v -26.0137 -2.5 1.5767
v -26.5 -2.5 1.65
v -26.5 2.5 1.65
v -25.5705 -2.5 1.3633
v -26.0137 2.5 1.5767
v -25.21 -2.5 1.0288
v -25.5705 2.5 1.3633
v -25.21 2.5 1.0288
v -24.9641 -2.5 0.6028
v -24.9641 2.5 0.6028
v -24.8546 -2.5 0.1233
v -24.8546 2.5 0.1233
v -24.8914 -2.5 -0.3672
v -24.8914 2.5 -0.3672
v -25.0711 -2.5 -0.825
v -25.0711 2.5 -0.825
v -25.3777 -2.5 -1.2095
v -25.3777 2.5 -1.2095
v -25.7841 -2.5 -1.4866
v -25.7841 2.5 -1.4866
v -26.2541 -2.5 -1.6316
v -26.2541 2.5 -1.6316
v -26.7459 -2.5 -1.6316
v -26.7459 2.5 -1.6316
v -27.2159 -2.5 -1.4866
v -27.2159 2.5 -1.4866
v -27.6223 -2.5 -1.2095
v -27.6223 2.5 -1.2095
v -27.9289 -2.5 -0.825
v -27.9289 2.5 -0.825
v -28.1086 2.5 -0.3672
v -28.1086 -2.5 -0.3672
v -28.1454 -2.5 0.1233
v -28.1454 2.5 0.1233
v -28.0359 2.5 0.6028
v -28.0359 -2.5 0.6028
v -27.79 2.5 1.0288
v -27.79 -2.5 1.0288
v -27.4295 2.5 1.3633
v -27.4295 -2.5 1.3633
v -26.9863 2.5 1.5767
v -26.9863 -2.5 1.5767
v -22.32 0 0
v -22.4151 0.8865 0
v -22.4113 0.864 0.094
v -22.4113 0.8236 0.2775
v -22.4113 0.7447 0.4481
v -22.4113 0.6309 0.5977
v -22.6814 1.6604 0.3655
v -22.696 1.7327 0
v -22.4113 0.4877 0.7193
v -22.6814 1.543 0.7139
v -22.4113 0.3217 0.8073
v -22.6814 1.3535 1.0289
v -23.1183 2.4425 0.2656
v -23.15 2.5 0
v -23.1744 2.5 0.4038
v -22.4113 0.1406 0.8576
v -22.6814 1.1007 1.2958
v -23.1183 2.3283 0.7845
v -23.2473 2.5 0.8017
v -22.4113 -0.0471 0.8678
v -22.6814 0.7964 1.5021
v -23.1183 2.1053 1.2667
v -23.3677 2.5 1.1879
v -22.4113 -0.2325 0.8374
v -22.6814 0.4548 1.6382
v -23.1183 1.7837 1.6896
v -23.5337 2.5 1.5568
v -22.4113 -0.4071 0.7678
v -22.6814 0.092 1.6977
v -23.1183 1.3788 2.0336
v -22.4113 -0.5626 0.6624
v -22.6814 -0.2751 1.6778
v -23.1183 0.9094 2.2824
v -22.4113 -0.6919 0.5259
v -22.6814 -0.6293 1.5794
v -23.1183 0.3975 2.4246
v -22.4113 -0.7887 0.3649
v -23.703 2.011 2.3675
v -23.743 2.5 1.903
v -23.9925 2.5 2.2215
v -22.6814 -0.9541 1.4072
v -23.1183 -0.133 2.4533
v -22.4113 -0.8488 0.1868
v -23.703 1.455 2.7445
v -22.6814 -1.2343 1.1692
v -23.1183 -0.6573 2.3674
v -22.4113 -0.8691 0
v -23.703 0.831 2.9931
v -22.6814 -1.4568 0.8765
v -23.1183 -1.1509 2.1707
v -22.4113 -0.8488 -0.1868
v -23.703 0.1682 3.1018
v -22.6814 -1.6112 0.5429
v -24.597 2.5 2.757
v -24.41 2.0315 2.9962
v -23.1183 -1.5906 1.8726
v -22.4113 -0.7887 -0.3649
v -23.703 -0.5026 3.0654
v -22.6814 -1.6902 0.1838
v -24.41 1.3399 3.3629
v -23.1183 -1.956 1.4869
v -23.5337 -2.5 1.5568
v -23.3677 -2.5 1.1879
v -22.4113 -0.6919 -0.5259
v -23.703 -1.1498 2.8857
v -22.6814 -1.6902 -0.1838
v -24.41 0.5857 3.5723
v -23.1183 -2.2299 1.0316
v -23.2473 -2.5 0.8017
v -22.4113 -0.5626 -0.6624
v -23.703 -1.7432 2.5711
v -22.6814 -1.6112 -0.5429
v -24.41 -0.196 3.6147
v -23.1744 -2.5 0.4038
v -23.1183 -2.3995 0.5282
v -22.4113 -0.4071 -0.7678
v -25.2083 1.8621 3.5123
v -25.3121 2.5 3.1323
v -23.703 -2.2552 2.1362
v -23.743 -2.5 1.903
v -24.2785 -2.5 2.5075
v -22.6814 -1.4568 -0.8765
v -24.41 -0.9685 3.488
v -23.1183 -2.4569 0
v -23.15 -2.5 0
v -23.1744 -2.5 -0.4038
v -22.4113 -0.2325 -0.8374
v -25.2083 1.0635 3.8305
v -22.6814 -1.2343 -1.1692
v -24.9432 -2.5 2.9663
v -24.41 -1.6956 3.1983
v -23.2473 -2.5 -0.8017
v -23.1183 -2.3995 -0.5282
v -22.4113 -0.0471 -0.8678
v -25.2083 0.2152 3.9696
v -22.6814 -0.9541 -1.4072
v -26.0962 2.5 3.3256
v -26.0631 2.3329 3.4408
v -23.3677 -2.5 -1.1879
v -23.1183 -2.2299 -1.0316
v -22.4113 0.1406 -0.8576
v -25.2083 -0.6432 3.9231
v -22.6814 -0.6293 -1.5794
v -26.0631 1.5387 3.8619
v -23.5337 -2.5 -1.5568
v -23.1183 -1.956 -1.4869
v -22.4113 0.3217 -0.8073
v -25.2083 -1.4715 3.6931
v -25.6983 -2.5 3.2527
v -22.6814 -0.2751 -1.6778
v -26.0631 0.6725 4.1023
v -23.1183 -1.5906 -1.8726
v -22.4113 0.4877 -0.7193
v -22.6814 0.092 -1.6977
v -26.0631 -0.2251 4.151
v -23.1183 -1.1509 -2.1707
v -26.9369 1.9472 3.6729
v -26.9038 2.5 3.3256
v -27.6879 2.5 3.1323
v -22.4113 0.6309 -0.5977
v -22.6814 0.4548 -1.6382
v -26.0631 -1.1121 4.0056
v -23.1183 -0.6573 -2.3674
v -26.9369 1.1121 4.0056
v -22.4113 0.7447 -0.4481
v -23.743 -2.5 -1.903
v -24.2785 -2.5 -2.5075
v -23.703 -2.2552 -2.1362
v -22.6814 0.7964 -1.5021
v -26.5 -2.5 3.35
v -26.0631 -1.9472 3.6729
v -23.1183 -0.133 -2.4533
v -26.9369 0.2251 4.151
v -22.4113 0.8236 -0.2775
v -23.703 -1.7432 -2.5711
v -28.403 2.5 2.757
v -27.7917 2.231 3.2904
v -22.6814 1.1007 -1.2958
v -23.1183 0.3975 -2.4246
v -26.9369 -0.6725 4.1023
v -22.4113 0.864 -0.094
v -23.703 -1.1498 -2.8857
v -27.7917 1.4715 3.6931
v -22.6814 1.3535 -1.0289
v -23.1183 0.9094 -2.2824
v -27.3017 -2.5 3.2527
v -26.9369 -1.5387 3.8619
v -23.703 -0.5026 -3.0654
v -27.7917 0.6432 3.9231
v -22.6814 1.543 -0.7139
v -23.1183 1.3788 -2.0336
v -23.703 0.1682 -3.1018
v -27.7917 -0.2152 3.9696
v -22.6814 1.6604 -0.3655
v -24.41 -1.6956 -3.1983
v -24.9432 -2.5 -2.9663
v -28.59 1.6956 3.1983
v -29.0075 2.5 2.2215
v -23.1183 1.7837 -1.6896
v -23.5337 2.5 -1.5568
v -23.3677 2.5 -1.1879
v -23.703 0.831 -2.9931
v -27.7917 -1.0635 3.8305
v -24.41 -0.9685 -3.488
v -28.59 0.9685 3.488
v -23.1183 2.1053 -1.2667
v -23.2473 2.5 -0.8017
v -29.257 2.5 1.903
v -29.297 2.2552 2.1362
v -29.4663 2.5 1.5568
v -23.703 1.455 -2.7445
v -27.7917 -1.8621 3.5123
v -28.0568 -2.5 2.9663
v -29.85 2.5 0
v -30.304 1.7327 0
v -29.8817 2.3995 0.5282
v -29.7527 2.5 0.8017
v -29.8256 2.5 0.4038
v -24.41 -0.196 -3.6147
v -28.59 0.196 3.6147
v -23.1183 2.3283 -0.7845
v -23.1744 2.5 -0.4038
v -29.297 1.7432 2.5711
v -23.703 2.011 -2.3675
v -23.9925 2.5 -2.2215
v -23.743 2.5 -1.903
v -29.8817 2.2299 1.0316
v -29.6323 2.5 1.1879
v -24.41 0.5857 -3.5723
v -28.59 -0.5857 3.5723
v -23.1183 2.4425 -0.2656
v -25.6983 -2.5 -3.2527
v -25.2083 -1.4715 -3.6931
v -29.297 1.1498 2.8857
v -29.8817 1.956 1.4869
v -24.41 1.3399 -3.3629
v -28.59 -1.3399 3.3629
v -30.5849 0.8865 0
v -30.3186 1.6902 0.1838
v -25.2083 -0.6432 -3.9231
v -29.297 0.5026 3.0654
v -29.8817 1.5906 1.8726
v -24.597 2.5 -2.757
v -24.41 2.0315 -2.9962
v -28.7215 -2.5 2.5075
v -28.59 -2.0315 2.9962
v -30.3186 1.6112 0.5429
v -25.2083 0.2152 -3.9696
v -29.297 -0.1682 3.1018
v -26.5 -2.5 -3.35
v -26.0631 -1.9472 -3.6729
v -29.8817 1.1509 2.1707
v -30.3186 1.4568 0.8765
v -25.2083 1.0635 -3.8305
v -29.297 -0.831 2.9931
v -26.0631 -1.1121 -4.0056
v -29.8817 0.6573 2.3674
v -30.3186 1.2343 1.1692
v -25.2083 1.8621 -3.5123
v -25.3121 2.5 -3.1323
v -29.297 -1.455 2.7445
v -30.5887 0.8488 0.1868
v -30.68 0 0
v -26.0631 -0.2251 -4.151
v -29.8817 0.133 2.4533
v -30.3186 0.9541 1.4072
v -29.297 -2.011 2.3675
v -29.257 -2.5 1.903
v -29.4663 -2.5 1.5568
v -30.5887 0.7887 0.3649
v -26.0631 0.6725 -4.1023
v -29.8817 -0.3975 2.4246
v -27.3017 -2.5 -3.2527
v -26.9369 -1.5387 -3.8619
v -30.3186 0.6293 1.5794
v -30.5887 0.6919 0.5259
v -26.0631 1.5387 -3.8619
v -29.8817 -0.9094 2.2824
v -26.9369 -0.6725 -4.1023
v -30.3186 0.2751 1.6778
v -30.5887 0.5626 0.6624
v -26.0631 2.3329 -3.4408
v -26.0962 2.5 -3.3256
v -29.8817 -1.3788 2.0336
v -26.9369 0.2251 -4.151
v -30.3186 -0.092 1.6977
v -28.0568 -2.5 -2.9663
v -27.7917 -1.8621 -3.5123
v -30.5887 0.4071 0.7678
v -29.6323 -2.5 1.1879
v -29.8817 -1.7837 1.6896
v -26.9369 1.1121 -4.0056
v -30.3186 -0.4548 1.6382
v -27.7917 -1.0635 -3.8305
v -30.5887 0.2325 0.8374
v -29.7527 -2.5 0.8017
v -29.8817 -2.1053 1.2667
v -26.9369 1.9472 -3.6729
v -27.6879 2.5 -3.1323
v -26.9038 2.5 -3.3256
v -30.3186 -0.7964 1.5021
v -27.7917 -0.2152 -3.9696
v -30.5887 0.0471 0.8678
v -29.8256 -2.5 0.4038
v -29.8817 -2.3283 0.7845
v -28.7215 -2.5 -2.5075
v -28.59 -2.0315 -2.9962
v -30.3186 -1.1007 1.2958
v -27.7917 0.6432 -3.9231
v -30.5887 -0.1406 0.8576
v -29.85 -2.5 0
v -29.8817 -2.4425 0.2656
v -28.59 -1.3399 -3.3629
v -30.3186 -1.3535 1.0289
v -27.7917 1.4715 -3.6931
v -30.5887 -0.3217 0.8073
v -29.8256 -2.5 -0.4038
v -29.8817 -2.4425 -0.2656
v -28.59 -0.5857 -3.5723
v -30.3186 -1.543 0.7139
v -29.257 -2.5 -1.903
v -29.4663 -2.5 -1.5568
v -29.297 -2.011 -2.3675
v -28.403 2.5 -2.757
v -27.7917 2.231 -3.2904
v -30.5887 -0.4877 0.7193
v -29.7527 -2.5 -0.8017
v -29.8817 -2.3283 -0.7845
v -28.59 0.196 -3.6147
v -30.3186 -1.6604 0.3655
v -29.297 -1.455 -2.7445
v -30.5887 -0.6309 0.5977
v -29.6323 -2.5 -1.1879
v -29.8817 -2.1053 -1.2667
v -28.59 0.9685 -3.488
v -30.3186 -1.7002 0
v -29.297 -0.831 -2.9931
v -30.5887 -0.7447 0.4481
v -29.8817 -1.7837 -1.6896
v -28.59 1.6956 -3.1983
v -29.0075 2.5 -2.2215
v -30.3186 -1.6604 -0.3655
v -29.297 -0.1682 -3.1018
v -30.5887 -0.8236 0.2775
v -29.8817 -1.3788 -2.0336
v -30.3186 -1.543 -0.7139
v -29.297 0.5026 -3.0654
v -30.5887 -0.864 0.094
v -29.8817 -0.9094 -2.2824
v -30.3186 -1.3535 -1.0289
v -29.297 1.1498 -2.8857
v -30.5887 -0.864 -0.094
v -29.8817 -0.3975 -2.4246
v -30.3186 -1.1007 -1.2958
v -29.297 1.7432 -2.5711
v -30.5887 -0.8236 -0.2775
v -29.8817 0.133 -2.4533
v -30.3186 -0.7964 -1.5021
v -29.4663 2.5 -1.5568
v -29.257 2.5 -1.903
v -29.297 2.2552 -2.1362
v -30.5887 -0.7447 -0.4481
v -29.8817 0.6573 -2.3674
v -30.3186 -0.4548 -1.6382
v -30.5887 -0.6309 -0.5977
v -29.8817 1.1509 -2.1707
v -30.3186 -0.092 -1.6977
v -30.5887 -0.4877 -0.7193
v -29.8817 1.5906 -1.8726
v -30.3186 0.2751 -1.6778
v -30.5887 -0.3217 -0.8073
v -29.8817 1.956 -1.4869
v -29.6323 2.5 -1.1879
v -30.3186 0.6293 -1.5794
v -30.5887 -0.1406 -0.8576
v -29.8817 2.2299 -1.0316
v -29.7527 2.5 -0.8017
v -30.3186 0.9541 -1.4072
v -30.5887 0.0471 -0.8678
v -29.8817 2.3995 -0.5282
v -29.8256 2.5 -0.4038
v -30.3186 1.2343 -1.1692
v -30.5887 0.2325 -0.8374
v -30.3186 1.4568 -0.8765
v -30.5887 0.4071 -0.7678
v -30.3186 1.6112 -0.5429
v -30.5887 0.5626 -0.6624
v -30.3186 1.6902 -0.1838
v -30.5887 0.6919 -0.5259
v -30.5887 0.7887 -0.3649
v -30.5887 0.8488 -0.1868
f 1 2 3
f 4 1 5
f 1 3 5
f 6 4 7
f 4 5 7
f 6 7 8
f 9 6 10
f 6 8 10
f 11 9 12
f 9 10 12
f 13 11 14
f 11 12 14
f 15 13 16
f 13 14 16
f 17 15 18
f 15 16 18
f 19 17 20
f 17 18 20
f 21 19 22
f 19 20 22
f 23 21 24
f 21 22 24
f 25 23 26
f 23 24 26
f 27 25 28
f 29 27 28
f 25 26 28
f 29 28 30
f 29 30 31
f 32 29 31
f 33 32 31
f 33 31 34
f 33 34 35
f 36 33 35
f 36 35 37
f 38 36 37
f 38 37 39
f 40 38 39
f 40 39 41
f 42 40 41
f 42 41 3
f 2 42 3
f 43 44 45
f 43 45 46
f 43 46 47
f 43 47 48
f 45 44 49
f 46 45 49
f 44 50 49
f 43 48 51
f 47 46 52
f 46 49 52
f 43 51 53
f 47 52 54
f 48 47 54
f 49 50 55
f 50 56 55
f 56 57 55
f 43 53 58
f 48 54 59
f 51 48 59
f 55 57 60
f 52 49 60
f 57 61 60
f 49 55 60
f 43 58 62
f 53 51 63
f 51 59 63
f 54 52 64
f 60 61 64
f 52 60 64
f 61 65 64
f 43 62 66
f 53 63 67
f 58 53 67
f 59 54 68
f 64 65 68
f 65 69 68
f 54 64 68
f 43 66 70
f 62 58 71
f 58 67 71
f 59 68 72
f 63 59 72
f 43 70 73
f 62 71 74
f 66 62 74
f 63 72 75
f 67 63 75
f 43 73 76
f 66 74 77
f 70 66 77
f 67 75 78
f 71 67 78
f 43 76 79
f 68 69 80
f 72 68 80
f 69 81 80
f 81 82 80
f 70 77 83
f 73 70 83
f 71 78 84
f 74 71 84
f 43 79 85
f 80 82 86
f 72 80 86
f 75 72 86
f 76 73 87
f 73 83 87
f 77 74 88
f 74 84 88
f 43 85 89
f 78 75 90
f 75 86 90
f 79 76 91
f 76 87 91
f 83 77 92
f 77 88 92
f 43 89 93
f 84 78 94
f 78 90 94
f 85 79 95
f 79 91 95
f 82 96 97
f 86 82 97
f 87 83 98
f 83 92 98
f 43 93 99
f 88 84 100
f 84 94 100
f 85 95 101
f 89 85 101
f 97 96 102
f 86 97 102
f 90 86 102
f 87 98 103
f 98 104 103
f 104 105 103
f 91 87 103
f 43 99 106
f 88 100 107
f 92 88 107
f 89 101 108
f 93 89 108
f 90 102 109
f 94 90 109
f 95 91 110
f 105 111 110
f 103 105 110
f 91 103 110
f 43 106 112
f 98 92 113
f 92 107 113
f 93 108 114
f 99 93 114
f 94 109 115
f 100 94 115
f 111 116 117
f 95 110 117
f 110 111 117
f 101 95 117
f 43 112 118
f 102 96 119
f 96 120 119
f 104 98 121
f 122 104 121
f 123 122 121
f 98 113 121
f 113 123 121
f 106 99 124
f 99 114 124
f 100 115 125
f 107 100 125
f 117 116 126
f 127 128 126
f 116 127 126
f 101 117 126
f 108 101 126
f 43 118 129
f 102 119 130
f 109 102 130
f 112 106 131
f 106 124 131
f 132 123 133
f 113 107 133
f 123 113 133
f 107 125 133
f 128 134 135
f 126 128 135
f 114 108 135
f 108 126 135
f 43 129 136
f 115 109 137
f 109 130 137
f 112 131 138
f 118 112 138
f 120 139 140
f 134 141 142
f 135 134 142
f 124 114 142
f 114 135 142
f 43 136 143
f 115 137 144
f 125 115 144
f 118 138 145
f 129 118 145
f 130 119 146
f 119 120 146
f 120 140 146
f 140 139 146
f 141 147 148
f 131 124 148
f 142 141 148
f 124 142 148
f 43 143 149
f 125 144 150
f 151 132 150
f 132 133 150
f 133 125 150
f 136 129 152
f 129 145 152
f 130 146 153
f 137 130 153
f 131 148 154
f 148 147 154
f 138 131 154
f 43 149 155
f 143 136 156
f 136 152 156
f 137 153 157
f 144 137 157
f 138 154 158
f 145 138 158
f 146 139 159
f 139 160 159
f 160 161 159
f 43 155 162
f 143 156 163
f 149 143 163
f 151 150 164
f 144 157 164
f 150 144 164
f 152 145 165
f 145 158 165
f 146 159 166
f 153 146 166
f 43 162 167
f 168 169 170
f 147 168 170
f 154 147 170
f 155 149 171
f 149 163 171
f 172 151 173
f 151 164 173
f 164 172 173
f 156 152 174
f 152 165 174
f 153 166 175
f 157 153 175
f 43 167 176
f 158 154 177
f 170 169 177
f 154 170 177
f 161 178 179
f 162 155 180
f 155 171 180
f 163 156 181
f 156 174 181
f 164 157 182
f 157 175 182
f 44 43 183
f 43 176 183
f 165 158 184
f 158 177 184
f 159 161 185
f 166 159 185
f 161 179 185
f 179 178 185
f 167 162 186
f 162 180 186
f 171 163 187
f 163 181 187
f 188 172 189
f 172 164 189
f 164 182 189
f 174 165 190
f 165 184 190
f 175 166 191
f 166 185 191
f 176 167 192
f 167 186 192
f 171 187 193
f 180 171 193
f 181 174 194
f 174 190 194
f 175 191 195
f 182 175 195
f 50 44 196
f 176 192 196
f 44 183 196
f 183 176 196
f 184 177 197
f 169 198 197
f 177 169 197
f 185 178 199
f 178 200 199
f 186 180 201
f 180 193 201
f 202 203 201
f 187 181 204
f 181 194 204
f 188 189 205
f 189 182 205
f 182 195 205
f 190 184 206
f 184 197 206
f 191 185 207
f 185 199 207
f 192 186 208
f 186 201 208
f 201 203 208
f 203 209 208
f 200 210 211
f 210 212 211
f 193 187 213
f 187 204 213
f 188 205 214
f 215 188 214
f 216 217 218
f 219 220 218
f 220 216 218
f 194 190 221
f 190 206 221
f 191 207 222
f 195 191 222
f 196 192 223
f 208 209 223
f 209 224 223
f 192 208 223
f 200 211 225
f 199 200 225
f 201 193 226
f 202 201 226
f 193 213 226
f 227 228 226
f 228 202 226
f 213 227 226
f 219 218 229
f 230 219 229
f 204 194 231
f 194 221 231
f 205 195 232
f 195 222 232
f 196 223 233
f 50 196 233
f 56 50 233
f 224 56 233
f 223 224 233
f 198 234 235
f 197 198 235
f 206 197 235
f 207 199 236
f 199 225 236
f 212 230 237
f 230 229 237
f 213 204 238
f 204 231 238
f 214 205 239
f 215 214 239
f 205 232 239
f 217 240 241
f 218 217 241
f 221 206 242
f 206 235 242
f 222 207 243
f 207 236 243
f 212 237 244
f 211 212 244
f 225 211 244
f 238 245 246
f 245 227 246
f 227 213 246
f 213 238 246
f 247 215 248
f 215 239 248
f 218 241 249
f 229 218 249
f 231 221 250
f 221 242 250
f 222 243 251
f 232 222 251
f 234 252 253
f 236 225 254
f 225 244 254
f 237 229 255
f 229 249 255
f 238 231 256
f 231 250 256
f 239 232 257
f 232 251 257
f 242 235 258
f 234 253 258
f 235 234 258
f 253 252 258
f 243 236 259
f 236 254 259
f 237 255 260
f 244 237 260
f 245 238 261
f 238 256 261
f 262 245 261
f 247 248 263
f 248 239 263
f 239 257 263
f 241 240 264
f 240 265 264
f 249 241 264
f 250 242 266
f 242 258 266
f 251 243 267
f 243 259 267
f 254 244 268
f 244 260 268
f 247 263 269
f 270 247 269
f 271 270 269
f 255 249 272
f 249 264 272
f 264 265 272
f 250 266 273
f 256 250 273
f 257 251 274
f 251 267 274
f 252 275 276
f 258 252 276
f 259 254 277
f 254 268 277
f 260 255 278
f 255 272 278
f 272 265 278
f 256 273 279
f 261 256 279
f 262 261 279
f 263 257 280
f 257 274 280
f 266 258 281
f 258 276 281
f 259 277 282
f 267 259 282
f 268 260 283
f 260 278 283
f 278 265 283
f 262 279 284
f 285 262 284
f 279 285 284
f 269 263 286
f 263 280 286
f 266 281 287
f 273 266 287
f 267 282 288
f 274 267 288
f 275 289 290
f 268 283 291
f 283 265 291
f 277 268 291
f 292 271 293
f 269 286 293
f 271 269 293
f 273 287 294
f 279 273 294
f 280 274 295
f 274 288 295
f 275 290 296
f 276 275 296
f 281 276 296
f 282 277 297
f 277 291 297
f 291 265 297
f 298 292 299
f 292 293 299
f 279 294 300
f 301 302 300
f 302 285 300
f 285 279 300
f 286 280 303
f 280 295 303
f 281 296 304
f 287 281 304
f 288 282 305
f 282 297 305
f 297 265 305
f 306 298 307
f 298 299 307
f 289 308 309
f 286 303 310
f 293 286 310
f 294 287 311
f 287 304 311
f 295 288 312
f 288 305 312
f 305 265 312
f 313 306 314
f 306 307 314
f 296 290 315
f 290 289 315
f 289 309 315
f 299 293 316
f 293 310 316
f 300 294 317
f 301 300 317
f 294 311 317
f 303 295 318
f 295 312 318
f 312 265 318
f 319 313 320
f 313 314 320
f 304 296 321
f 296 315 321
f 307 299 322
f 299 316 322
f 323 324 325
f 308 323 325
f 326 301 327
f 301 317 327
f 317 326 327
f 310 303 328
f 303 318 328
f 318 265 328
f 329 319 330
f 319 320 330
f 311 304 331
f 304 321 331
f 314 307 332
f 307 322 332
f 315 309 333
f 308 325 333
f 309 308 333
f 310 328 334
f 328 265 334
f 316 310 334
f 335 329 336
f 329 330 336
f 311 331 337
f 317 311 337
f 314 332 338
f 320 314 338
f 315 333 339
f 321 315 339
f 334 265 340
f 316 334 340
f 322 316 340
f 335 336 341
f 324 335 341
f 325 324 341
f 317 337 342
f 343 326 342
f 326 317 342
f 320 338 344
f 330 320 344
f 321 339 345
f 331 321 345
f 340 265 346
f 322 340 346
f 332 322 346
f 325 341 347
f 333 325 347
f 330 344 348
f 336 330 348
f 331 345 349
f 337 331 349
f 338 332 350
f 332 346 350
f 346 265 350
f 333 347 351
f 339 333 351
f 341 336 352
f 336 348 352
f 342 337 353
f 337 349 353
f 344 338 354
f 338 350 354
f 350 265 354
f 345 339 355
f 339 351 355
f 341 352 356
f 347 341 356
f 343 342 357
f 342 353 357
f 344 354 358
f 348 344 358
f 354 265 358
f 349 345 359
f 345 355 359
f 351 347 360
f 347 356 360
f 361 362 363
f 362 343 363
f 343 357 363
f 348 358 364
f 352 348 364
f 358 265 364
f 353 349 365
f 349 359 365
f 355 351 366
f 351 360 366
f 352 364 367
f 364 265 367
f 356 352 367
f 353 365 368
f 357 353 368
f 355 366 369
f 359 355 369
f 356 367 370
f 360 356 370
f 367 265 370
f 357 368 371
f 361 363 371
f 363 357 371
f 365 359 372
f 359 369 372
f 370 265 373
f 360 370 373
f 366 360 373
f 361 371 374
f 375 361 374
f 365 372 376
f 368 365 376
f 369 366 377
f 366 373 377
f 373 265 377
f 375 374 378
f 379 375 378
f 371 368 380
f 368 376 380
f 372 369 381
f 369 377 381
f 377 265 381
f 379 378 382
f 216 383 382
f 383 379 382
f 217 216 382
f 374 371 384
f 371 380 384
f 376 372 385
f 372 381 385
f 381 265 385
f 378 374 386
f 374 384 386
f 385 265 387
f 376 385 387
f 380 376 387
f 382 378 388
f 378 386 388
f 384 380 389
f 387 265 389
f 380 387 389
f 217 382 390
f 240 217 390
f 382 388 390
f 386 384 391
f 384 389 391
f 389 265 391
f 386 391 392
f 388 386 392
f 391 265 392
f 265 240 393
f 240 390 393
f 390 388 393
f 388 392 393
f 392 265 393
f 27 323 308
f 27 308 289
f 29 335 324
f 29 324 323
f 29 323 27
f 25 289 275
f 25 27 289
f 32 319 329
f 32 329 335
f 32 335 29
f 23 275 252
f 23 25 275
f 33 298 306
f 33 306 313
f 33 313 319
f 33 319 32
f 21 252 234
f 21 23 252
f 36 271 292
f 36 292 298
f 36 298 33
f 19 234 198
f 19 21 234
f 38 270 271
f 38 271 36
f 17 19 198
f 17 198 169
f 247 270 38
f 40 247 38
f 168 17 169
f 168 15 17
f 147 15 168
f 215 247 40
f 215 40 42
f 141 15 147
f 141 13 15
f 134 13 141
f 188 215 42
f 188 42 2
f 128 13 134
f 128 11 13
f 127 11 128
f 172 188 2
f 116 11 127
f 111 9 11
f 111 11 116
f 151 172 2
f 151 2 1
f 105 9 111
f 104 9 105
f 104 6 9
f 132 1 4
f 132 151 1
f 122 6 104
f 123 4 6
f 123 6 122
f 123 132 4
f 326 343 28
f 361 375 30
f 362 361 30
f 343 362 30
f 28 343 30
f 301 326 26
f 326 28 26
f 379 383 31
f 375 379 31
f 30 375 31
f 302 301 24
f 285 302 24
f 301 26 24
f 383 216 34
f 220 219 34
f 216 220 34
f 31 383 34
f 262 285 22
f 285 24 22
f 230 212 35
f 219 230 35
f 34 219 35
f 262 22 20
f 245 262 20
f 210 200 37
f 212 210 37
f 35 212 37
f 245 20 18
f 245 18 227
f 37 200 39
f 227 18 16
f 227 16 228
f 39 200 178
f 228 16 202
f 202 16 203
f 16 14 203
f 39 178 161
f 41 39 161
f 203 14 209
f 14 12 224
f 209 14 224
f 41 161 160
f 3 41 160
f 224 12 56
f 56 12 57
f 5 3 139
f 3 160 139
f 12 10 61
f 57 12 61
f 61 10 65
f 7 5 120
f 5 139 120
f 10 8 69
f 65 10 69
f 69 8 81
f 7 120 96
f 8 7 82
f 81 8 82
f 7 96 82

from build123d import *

# Parameters (mm, degrees)
SKETCH1_W           = 65
SKETCH1_H           = 5
BOSS_EXTRUDE1_DEPTH = 5
SKETCH3_R           = 1.65
CUT_EXTRUDE2_DEPTH  = 32.364560159


# Read off the part's stored shape, not the designer's step: Cut-Revolve1
with BuildPart() as part:
    # Sketch1 → Boss-Extrude1 (new, symmetric)
    with BuildSketch(Plane.XY):
        Rectangle(SKETCH1_W, SKETCH1_H)
    extrude(amount=BOSS_EXTRUDE1_DEPTH, both=True)

    # Cut-Revolve1 outline → Cut-Revolve1 (revolve, cut)
    with BuildSketch(Plane.YX):
        with BuildLine():
            Line((5.590169944, -32.5), (5.590169944, 32.5))
            Line((5.590169944, 32.5), (0, 32.5))
            Line((0, 32.5), (0, -22.319988038))
            ThreePointArc((0, -22.319988038), (4.180011962, -26.5), (0, -30.680011962))
            Line((0, -30.680011962), (0, -32.5))
            Line((0, -32.5), (5.590169944, -32.5))
        make_face()
    revolve(axis=Axis((0, 0, 0), (1, 0, 0)), mode=Mode.SUBTRACT)

    # Sketch3 → Cut-Extrude2 (cut, through all)
    with BuildSketch(Plane(origin=(0, 2.5, 0), x_dir=(1, 0, 0), z_dir=(0, 1, 0))):
        with Locations(Location((-26.5, 0, 0), (0, 0, 270))):
            Circle(SKETCH3_R)
    extrude(amount=-CUT_EXTRUDE2_DEPTH, mode=Mode.SUBTRACT)


solid = part.part
